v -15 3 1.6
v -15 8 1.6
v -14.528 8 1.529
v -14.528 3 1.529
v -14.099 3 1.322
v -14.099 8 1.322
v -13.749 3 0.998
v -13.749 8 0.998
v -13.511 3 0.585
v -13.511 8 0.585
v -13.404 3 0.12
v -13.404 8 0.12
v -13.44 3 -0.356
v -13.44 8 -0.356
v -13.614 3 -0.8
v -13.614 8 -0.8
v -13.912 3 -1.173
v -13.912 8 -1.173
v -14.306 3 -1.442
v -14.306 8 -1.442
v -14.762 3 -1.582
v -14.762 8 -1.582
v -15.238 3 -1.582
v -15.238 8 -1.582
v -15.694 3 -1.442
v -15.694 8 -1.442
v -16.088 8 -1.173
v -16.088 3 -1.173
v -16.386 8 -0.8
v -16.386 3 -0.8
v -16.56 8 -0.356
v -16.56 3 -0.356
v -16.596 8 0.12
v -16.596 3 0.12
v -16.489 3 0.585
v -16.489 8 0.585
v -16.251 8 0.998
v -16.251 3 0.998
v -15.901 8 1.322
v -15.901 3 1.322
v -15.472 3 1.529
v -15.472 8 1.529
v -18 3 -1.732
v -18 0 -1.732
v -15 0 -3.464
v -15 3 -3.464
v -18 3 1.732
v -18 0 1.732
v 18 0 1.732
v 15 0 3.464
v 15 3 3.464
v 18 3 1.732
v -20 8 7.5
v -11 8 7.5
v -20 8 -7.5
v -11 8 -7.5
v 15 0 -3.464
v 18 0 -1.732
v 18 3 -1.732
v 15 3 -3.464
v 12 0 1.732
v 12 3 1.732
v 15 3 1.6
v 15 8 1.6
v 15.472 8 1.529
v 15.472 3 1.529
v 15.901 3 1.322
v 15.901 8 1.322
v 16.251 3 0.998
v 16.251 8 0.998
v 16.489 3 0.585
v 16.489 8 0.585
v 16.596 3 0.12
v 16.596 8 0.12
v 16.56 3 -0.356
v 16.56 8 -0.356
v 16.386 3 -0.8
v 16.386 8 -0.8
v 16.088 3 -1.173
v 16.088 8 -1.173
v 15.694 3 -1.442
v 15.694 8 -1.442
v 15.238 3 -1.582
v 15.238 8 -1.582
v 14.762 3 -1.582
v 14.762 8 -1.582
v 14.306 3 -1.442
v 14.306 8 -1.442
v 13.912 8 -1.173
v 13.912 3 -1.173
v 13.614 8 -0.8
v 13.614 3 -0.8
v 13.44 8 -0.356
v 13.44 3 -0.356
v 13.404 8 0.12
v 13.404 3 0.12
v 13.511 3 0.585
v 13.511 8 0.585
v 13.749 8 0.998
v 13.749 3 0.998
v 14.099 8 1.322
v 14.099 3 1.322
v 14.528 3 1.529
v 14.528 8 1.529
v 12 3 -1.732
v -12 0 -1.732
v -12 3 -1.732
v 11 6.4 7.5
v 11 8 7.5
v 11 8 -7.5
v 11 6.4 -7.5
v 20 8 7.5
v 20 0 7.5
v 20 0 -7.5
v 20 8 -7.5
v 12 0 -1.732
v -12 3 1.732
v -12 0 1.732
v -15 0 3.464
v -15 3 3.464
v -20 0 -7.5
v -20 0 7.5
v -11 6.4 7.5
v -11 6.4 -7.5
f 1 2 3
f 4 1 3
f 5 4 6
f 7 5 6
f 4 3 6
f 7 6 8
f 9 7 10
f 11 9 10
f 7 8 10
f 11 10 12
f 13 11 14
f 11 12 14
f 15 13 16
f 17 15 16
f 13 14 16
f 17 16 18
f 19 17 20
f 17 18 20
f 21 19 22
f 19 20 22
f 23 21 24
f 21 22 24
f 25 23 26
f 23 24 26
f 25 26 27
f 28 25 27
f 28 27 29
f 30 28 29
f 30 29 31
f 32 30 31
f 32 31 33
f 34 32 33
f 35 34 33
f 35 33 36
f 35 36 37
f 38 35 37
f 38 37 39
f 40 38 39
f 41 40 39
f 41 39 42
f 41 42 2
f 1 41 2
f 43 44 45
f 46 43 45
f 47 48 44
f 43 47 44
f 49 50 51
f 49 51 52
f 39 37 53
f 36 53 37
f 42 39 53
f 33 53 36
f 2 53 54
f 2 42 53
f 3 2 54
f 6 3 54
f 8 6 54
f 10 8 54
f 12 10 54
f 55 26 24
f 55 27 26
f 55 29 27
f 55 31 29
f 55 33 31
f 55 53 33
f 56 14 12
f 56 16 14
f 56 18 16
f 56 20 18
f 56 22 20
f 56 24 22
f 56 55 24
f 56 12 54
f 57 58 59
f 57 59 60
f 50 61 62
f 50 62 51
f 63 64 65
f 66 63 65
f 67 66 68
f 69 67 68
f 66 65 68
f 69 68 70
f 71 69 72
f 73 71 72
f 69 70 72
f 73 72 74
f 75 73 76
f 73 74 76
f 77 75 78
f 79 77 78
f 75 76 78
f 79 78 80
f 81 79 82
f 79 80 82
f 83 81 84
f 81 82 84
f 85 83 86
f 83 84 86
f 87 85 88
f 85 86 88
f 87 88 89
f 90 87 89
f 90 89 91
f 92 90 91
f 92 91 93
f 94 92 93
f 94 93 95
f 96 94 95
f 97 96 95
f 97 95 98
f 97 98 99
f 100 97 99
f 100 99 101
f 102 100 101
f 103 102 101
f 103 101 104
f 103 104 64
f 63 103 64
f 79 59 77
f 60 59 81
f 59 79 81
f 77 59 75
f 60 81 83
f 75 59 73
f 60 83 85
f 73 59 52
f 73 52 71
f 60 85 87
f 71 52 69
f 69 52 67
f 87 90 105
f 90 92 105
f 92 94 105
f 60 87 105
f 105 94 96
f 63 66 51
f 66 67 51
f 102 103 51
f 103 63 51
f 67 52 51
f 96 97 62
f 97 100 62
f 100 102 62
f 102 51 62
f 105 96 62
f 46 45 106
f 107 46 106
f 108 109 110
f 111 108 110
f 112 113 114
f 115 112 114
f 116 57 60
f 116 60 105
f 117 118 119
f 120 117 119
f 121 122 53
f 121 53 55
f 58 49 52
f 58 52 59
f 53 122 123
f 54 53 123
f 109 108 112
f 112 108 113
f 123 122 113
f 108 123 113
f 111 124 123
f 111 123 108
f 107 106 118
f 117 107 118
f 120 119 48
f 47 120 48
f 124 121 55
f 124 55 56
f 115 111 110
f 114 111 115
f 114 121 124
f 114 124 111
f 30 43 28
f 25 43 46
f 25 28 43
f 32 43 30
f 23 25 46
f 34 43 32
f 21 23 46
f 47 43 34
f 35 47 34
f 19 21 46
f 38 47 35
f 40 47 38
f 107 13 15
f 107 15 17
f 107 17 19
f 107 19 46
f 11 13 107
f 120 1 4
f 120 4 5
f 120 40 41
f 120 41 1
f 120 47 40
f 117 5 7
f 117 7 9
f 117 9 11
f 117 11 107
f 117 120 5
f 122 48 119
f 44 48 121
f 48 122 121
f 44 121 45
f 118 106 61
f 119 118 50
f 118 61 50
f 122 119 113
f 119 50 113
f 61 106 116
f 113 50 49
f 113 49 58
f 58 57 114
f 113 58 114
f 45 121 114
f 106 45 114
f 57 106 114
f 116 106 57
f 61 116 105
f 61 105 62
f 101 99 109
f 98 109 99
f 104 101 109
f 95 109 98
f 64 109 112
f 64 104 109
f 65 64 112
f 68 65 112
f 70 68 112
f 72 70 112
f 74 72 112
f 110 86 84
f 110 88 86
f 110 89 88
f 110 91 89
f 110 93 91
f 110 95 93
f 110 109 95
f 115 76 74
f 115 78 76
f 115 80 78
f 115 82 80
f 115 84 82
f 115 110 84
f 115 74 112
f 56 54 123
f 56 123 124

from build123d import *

# Parameters (mm, degrees)
SKETCH1_W           = 40
SKETCH1_H           = 15
BOSS_EXTRUDE1_DEPTH = 8
SKETCH2_R           = 1.6
CUT_EXTRUDE1_DEPTH  = 23.808989456
SKETCH3_W           = 22
SKETCH3_H           = 15
CUT_EXTRUDE2_DEPTH  = 1.6
CUT_EXTRUDE3_DEPTH  = 3


with BuildPart() as part:
    # Sketch1 → Boss-Extrude1 (new body)
    with BuildSketch(Plane(origin=(0, 0, 0), x_dir=(1, 0, 0), z_dir=(0, 1, 0))):
        Rectangle(SKETCH1_W, SKETCH1_H)
    extrude(amount=BOSS_EXTRUDE1_DEPTH)

    # Sketch2 → Cut-Extrude1 (cut, through all)
    with BuildSketch(Plane(origin=(0, 8, 0), x_dir=(1, 0, 0), z_dir=(0, 1, 0))):
        with Locations(Location((-15, 0, 0), (0, 0, 270))):
            Circle(SKETCH2_R)
        with Locations(Location((15, 0, 0), (0, 0, 270))):
            Circle(SKETCH2_R)
    extrude(amount=-CUT_EXTRUDE1_DEPTH, mode=Mode.SUBTRACT)

    # Sketch3 → Cut-Extrude2 (cut)
    with BuildSketch(Plane(origin=(0, 8, 0), x_dir=(1, 0, 0), z_dir=(0, 1, 0))):
        Rectangle(SKETCH3_W, SKETCH3_H)
    extrude(amount=-CUT_EXTRUDE2_DEPTH, mode=Mode.SUBTRACT)

    # Sketch4 → Cut-Extrude3 (cut)
    with BuildSketch(Plane.XZ):
        Polygon((-12, 1.732050808), (-15, 3.464101615), (-18, 1.732050808), (-18, -1.732050808), (-15, -3.464101615), (-12, -1.732050808), align=None)
        Polygon((12, -1.732050808), (12, 1.732050808), (15, 3.464101615), (18, 1.732050808), (18, -1.732050808), (15, -3.464101615), align=None)
    extrude(amount=-CUT_EXTRUDE3_DEPTH, mode=Mode.SUBTRACT)


solid = part.part
